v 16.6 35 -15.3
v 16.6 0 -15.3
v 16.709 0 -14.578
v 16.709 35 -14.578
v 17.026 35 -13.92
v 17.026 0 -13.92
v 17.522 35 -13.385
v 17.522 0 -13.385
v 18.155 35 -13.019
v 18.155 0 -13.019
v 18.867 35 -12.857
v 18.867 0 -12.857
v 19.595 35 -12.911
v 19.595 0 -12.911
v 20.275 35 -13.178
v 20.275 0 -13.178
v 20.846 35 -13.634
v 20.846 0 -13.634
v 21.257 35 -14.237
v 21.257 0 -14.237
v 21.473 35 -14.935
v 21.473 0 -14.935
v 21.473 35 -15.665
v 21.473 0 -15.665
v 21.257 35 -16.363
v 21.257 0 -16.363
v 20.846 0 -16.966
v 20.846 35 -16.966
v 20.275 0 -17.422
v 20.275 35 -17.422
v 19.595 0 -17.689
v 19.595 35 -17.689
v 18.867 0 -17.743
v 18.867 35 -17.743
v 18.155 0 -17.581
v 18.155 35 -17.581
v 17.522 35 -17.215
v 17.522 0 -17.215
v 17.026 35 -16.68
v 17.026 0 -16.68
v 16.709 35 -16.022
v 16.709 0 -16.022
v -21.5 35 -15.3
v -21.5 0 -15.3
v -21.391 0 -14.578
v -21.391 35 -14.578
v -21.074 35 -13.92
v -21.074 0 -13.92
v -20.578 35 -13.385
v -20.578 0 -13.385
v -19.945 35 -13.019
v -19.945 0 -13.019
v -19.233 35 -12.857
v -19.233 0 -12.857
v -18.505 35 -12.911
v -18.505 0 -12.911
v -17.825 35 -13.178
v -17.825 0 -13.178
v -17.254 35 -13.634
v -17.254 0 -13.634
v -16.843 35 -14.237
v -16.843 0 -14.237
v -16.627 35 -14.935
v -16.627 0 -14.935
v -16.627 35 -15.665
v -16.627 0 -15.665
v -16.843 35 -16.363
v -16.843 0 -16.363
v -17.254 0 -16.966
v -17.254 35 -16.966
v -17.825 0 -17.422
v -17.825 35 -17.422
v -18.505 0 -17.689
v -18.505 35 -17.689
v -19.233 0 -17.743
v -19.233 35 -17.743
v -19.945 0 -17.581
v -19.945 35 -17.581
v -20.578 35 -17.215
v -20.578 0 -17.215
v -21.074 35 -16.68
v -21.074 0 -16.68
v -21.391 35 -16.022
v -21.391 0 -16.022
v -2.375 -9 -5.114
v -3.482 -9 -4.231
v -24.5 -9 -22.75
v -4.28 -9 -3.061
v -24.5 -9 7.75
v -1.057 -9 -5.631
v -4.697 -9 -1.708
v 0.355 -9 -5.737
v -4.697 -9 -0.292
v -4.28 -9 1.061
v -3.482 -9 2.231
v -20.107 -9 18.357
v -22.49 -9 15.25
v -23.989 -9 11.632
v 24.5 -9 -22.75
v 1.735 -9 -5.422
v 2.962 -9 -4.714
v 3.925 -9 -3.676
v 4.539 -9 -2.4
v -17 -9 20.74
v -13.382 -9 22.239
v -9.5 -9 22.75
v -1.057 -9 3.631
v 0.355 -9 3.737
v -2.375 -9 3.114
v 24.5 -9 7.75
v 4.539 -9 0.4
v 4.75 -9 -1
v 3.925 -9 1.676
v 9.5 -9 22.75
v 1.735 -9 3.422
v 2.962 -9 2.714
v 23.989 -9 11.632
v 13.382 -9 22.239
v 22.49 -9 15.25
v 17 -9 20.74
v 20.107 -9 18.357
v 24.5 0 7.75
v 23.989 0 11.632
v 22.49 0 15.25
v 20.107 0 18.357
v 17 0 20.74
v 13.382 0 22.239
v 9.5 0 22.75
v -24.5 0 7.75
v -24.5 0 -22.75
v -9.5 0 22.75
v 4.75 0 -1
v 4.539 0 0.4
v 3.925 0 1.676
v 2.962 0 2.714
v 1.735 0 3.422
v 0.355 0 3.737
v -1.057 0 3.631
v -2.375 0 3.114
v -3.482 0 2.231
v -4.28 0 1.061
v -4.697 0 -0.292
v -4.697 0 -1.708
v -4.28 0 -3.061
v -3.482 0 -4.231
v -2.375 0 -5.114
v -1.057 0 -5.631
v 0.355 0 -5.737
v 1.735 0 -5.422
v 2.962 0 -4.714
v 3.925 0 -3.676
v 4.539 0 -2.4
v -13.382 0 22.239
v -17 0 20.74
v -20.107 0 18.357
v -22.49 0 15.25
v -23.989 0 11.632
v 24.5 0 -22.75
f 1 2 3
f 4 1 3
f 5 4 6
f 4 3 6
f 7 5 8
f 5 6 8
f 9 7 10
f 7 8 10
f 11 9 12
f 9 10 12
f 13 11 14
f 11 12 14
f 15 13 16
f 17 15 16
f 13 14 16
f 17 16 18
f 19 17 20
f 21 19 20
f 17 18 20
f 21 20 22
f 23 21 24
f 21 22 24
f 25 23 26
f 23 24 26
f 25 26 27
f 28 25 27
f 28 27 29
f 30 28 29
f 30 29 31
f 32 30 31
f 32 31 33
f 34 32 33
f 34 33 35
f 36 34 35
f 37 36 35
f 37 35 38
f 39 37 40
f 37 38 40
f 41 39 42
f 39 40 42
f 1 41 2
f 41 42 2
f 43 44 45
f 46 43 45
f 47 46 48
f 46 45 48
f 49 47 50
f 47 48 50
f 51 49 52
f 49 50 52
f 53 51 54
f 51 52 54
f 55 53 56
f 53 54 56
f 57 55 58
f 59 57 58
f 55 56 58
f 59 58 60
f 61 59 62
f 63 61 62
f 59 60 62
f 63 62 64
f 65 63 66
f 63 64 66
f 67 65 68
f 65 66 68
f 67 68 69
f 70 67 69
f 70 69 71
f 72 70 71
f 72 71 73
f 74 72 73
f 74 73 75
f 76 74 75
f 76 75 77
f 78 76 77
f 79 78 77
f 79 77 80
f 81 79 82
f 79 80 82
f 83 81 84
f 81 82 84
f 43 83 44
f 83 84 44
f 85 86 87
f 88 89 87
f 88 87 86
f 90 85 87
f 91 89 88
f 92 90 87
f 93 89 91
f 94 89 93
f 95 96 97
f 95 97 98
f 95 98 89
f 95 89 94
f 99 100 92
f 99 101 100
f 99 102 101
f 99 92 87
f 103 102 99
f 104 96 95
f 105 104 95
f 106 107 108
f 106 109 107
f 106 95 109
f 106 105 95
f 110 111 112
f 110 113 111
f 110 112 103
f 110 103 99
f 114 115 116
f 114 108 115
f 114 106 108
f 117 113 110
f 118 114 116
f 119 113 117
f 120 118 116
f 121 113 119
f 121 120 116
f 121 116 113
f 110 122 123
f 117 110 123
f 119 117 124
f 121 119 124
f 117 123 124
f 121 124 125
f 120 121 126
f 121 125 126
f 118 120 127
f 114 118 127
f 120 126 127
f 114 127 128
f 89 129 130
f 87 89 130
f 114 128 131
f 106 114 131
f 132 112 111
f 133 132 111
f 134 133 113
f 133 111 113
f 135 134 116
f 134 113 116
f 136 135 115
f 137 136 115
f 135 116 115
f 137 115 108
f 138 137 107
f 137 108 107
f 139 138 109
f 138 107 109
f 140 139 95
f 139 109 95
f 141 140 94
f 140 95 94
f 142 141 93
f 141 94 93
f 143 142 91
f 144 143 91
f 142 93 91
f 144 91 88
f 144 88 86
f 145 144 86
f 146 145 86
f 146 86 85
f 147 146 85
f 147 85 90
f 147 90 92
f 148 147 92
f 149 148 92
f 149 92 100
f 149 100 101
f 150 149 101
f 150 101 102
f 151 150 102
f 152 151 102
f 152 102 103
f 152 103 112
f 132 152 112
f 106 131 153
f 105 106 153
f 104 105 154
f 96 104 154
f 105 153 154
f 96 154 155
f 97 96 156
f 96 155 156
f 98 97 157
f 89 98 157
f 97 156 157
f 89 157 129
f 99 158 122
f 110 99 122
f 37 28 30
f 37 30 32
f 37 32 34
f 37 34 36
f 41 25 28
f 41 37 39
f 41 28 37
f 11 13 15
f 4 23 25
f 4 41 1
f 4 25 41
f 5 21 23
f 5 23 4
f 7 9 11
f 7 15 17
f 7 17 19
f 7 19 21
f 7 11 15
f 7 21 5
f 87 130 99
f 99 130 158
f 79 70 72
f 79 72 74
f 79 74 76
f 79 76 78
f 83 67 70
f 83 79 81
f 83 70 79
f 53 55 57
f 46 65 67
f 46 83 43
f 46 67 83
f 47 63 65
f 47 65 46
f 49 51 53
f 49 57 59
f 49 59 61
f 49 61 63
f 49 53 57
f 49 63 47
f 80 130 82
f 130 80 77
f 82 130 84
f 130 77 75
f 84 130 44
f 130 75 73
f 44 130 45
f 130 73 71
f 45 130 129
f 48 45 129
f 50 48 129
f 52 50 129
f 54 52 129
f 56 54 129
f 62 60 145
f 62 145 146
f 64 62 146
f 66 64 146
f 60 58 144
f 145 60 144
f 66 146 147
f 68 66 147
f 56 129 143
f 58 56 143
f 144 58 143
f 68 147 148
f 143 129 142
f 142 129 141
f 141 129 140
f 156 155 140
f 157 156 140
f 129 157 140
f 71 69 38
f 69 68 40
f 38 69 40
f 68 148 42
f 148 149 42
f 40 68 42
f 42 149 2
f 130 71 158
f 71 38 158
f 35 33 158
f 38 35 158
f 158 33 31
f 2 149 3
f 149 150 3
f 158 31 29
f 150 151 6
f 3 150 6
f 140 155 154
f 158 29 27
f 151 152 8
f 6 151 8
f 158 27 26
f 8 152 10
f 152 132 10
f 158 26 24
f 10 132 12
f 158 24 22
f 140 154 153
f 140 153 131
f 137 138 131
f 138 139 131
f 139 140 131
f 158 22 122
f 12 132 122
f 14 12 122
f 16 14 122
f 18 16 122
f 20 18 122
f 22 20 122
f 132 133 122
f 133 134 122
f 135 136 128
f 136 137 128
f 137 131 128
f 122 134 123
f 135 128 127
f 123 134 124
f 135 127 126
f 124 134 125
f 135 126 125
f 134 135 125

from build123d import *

# Parameters (mm, degrees)
F1_DEPTH = 9
F2_R     = 4.75
F3_DEPTH = 25
F4_R     = 2.45
F5_DEPTH = 35


with BuildPart() as f1:
    # F0 (on Front) → F1 (new body)
    with BuildSketch(Plane.XZ):
        with BuildLine():
            Line((-24.5, -22.75), (24.5, -22.75))
            Line((24.5, -22.75), (24.5, 7.75))
            ThreePointArc((24.5, 7.75), (20.106602, 18.356602), (9.5, 22.75))
            Line((9.5, 22.75), (-9.5, 22.75))
            ThreePointArc((-9.5, 22.75), (-20.106602, 18.356602), (-24.5, 7.75))
            Line((-24.5, 7.75), (-24.5, -22.75))
        make_face()
    extrude(amount=F1_DEPTH)

    # F2 (on face) → F3 (cut)
    with BuildSketch(Plane.XZ.offset(9)):
        with Locations((0, -1)):
            Circle(F2_R)
    extrude(amount=-F3_DEPTH, mode=Mode.SUBTRACT)

    # F4 (on face) → F5 (join)
    with BuildSketch(Plane(origin=(0, 0, 0), x_dir=(-1, 0, 0), z_dir=(0, 1, 0))):
        with Locations((-19.05, -15.3)):
            Circle(F4_R)
        with Locations((19.05, -15.3)):
            Circle(F4_R)
    extrude(amount=F5_DEPTH)


solid = f1.part
